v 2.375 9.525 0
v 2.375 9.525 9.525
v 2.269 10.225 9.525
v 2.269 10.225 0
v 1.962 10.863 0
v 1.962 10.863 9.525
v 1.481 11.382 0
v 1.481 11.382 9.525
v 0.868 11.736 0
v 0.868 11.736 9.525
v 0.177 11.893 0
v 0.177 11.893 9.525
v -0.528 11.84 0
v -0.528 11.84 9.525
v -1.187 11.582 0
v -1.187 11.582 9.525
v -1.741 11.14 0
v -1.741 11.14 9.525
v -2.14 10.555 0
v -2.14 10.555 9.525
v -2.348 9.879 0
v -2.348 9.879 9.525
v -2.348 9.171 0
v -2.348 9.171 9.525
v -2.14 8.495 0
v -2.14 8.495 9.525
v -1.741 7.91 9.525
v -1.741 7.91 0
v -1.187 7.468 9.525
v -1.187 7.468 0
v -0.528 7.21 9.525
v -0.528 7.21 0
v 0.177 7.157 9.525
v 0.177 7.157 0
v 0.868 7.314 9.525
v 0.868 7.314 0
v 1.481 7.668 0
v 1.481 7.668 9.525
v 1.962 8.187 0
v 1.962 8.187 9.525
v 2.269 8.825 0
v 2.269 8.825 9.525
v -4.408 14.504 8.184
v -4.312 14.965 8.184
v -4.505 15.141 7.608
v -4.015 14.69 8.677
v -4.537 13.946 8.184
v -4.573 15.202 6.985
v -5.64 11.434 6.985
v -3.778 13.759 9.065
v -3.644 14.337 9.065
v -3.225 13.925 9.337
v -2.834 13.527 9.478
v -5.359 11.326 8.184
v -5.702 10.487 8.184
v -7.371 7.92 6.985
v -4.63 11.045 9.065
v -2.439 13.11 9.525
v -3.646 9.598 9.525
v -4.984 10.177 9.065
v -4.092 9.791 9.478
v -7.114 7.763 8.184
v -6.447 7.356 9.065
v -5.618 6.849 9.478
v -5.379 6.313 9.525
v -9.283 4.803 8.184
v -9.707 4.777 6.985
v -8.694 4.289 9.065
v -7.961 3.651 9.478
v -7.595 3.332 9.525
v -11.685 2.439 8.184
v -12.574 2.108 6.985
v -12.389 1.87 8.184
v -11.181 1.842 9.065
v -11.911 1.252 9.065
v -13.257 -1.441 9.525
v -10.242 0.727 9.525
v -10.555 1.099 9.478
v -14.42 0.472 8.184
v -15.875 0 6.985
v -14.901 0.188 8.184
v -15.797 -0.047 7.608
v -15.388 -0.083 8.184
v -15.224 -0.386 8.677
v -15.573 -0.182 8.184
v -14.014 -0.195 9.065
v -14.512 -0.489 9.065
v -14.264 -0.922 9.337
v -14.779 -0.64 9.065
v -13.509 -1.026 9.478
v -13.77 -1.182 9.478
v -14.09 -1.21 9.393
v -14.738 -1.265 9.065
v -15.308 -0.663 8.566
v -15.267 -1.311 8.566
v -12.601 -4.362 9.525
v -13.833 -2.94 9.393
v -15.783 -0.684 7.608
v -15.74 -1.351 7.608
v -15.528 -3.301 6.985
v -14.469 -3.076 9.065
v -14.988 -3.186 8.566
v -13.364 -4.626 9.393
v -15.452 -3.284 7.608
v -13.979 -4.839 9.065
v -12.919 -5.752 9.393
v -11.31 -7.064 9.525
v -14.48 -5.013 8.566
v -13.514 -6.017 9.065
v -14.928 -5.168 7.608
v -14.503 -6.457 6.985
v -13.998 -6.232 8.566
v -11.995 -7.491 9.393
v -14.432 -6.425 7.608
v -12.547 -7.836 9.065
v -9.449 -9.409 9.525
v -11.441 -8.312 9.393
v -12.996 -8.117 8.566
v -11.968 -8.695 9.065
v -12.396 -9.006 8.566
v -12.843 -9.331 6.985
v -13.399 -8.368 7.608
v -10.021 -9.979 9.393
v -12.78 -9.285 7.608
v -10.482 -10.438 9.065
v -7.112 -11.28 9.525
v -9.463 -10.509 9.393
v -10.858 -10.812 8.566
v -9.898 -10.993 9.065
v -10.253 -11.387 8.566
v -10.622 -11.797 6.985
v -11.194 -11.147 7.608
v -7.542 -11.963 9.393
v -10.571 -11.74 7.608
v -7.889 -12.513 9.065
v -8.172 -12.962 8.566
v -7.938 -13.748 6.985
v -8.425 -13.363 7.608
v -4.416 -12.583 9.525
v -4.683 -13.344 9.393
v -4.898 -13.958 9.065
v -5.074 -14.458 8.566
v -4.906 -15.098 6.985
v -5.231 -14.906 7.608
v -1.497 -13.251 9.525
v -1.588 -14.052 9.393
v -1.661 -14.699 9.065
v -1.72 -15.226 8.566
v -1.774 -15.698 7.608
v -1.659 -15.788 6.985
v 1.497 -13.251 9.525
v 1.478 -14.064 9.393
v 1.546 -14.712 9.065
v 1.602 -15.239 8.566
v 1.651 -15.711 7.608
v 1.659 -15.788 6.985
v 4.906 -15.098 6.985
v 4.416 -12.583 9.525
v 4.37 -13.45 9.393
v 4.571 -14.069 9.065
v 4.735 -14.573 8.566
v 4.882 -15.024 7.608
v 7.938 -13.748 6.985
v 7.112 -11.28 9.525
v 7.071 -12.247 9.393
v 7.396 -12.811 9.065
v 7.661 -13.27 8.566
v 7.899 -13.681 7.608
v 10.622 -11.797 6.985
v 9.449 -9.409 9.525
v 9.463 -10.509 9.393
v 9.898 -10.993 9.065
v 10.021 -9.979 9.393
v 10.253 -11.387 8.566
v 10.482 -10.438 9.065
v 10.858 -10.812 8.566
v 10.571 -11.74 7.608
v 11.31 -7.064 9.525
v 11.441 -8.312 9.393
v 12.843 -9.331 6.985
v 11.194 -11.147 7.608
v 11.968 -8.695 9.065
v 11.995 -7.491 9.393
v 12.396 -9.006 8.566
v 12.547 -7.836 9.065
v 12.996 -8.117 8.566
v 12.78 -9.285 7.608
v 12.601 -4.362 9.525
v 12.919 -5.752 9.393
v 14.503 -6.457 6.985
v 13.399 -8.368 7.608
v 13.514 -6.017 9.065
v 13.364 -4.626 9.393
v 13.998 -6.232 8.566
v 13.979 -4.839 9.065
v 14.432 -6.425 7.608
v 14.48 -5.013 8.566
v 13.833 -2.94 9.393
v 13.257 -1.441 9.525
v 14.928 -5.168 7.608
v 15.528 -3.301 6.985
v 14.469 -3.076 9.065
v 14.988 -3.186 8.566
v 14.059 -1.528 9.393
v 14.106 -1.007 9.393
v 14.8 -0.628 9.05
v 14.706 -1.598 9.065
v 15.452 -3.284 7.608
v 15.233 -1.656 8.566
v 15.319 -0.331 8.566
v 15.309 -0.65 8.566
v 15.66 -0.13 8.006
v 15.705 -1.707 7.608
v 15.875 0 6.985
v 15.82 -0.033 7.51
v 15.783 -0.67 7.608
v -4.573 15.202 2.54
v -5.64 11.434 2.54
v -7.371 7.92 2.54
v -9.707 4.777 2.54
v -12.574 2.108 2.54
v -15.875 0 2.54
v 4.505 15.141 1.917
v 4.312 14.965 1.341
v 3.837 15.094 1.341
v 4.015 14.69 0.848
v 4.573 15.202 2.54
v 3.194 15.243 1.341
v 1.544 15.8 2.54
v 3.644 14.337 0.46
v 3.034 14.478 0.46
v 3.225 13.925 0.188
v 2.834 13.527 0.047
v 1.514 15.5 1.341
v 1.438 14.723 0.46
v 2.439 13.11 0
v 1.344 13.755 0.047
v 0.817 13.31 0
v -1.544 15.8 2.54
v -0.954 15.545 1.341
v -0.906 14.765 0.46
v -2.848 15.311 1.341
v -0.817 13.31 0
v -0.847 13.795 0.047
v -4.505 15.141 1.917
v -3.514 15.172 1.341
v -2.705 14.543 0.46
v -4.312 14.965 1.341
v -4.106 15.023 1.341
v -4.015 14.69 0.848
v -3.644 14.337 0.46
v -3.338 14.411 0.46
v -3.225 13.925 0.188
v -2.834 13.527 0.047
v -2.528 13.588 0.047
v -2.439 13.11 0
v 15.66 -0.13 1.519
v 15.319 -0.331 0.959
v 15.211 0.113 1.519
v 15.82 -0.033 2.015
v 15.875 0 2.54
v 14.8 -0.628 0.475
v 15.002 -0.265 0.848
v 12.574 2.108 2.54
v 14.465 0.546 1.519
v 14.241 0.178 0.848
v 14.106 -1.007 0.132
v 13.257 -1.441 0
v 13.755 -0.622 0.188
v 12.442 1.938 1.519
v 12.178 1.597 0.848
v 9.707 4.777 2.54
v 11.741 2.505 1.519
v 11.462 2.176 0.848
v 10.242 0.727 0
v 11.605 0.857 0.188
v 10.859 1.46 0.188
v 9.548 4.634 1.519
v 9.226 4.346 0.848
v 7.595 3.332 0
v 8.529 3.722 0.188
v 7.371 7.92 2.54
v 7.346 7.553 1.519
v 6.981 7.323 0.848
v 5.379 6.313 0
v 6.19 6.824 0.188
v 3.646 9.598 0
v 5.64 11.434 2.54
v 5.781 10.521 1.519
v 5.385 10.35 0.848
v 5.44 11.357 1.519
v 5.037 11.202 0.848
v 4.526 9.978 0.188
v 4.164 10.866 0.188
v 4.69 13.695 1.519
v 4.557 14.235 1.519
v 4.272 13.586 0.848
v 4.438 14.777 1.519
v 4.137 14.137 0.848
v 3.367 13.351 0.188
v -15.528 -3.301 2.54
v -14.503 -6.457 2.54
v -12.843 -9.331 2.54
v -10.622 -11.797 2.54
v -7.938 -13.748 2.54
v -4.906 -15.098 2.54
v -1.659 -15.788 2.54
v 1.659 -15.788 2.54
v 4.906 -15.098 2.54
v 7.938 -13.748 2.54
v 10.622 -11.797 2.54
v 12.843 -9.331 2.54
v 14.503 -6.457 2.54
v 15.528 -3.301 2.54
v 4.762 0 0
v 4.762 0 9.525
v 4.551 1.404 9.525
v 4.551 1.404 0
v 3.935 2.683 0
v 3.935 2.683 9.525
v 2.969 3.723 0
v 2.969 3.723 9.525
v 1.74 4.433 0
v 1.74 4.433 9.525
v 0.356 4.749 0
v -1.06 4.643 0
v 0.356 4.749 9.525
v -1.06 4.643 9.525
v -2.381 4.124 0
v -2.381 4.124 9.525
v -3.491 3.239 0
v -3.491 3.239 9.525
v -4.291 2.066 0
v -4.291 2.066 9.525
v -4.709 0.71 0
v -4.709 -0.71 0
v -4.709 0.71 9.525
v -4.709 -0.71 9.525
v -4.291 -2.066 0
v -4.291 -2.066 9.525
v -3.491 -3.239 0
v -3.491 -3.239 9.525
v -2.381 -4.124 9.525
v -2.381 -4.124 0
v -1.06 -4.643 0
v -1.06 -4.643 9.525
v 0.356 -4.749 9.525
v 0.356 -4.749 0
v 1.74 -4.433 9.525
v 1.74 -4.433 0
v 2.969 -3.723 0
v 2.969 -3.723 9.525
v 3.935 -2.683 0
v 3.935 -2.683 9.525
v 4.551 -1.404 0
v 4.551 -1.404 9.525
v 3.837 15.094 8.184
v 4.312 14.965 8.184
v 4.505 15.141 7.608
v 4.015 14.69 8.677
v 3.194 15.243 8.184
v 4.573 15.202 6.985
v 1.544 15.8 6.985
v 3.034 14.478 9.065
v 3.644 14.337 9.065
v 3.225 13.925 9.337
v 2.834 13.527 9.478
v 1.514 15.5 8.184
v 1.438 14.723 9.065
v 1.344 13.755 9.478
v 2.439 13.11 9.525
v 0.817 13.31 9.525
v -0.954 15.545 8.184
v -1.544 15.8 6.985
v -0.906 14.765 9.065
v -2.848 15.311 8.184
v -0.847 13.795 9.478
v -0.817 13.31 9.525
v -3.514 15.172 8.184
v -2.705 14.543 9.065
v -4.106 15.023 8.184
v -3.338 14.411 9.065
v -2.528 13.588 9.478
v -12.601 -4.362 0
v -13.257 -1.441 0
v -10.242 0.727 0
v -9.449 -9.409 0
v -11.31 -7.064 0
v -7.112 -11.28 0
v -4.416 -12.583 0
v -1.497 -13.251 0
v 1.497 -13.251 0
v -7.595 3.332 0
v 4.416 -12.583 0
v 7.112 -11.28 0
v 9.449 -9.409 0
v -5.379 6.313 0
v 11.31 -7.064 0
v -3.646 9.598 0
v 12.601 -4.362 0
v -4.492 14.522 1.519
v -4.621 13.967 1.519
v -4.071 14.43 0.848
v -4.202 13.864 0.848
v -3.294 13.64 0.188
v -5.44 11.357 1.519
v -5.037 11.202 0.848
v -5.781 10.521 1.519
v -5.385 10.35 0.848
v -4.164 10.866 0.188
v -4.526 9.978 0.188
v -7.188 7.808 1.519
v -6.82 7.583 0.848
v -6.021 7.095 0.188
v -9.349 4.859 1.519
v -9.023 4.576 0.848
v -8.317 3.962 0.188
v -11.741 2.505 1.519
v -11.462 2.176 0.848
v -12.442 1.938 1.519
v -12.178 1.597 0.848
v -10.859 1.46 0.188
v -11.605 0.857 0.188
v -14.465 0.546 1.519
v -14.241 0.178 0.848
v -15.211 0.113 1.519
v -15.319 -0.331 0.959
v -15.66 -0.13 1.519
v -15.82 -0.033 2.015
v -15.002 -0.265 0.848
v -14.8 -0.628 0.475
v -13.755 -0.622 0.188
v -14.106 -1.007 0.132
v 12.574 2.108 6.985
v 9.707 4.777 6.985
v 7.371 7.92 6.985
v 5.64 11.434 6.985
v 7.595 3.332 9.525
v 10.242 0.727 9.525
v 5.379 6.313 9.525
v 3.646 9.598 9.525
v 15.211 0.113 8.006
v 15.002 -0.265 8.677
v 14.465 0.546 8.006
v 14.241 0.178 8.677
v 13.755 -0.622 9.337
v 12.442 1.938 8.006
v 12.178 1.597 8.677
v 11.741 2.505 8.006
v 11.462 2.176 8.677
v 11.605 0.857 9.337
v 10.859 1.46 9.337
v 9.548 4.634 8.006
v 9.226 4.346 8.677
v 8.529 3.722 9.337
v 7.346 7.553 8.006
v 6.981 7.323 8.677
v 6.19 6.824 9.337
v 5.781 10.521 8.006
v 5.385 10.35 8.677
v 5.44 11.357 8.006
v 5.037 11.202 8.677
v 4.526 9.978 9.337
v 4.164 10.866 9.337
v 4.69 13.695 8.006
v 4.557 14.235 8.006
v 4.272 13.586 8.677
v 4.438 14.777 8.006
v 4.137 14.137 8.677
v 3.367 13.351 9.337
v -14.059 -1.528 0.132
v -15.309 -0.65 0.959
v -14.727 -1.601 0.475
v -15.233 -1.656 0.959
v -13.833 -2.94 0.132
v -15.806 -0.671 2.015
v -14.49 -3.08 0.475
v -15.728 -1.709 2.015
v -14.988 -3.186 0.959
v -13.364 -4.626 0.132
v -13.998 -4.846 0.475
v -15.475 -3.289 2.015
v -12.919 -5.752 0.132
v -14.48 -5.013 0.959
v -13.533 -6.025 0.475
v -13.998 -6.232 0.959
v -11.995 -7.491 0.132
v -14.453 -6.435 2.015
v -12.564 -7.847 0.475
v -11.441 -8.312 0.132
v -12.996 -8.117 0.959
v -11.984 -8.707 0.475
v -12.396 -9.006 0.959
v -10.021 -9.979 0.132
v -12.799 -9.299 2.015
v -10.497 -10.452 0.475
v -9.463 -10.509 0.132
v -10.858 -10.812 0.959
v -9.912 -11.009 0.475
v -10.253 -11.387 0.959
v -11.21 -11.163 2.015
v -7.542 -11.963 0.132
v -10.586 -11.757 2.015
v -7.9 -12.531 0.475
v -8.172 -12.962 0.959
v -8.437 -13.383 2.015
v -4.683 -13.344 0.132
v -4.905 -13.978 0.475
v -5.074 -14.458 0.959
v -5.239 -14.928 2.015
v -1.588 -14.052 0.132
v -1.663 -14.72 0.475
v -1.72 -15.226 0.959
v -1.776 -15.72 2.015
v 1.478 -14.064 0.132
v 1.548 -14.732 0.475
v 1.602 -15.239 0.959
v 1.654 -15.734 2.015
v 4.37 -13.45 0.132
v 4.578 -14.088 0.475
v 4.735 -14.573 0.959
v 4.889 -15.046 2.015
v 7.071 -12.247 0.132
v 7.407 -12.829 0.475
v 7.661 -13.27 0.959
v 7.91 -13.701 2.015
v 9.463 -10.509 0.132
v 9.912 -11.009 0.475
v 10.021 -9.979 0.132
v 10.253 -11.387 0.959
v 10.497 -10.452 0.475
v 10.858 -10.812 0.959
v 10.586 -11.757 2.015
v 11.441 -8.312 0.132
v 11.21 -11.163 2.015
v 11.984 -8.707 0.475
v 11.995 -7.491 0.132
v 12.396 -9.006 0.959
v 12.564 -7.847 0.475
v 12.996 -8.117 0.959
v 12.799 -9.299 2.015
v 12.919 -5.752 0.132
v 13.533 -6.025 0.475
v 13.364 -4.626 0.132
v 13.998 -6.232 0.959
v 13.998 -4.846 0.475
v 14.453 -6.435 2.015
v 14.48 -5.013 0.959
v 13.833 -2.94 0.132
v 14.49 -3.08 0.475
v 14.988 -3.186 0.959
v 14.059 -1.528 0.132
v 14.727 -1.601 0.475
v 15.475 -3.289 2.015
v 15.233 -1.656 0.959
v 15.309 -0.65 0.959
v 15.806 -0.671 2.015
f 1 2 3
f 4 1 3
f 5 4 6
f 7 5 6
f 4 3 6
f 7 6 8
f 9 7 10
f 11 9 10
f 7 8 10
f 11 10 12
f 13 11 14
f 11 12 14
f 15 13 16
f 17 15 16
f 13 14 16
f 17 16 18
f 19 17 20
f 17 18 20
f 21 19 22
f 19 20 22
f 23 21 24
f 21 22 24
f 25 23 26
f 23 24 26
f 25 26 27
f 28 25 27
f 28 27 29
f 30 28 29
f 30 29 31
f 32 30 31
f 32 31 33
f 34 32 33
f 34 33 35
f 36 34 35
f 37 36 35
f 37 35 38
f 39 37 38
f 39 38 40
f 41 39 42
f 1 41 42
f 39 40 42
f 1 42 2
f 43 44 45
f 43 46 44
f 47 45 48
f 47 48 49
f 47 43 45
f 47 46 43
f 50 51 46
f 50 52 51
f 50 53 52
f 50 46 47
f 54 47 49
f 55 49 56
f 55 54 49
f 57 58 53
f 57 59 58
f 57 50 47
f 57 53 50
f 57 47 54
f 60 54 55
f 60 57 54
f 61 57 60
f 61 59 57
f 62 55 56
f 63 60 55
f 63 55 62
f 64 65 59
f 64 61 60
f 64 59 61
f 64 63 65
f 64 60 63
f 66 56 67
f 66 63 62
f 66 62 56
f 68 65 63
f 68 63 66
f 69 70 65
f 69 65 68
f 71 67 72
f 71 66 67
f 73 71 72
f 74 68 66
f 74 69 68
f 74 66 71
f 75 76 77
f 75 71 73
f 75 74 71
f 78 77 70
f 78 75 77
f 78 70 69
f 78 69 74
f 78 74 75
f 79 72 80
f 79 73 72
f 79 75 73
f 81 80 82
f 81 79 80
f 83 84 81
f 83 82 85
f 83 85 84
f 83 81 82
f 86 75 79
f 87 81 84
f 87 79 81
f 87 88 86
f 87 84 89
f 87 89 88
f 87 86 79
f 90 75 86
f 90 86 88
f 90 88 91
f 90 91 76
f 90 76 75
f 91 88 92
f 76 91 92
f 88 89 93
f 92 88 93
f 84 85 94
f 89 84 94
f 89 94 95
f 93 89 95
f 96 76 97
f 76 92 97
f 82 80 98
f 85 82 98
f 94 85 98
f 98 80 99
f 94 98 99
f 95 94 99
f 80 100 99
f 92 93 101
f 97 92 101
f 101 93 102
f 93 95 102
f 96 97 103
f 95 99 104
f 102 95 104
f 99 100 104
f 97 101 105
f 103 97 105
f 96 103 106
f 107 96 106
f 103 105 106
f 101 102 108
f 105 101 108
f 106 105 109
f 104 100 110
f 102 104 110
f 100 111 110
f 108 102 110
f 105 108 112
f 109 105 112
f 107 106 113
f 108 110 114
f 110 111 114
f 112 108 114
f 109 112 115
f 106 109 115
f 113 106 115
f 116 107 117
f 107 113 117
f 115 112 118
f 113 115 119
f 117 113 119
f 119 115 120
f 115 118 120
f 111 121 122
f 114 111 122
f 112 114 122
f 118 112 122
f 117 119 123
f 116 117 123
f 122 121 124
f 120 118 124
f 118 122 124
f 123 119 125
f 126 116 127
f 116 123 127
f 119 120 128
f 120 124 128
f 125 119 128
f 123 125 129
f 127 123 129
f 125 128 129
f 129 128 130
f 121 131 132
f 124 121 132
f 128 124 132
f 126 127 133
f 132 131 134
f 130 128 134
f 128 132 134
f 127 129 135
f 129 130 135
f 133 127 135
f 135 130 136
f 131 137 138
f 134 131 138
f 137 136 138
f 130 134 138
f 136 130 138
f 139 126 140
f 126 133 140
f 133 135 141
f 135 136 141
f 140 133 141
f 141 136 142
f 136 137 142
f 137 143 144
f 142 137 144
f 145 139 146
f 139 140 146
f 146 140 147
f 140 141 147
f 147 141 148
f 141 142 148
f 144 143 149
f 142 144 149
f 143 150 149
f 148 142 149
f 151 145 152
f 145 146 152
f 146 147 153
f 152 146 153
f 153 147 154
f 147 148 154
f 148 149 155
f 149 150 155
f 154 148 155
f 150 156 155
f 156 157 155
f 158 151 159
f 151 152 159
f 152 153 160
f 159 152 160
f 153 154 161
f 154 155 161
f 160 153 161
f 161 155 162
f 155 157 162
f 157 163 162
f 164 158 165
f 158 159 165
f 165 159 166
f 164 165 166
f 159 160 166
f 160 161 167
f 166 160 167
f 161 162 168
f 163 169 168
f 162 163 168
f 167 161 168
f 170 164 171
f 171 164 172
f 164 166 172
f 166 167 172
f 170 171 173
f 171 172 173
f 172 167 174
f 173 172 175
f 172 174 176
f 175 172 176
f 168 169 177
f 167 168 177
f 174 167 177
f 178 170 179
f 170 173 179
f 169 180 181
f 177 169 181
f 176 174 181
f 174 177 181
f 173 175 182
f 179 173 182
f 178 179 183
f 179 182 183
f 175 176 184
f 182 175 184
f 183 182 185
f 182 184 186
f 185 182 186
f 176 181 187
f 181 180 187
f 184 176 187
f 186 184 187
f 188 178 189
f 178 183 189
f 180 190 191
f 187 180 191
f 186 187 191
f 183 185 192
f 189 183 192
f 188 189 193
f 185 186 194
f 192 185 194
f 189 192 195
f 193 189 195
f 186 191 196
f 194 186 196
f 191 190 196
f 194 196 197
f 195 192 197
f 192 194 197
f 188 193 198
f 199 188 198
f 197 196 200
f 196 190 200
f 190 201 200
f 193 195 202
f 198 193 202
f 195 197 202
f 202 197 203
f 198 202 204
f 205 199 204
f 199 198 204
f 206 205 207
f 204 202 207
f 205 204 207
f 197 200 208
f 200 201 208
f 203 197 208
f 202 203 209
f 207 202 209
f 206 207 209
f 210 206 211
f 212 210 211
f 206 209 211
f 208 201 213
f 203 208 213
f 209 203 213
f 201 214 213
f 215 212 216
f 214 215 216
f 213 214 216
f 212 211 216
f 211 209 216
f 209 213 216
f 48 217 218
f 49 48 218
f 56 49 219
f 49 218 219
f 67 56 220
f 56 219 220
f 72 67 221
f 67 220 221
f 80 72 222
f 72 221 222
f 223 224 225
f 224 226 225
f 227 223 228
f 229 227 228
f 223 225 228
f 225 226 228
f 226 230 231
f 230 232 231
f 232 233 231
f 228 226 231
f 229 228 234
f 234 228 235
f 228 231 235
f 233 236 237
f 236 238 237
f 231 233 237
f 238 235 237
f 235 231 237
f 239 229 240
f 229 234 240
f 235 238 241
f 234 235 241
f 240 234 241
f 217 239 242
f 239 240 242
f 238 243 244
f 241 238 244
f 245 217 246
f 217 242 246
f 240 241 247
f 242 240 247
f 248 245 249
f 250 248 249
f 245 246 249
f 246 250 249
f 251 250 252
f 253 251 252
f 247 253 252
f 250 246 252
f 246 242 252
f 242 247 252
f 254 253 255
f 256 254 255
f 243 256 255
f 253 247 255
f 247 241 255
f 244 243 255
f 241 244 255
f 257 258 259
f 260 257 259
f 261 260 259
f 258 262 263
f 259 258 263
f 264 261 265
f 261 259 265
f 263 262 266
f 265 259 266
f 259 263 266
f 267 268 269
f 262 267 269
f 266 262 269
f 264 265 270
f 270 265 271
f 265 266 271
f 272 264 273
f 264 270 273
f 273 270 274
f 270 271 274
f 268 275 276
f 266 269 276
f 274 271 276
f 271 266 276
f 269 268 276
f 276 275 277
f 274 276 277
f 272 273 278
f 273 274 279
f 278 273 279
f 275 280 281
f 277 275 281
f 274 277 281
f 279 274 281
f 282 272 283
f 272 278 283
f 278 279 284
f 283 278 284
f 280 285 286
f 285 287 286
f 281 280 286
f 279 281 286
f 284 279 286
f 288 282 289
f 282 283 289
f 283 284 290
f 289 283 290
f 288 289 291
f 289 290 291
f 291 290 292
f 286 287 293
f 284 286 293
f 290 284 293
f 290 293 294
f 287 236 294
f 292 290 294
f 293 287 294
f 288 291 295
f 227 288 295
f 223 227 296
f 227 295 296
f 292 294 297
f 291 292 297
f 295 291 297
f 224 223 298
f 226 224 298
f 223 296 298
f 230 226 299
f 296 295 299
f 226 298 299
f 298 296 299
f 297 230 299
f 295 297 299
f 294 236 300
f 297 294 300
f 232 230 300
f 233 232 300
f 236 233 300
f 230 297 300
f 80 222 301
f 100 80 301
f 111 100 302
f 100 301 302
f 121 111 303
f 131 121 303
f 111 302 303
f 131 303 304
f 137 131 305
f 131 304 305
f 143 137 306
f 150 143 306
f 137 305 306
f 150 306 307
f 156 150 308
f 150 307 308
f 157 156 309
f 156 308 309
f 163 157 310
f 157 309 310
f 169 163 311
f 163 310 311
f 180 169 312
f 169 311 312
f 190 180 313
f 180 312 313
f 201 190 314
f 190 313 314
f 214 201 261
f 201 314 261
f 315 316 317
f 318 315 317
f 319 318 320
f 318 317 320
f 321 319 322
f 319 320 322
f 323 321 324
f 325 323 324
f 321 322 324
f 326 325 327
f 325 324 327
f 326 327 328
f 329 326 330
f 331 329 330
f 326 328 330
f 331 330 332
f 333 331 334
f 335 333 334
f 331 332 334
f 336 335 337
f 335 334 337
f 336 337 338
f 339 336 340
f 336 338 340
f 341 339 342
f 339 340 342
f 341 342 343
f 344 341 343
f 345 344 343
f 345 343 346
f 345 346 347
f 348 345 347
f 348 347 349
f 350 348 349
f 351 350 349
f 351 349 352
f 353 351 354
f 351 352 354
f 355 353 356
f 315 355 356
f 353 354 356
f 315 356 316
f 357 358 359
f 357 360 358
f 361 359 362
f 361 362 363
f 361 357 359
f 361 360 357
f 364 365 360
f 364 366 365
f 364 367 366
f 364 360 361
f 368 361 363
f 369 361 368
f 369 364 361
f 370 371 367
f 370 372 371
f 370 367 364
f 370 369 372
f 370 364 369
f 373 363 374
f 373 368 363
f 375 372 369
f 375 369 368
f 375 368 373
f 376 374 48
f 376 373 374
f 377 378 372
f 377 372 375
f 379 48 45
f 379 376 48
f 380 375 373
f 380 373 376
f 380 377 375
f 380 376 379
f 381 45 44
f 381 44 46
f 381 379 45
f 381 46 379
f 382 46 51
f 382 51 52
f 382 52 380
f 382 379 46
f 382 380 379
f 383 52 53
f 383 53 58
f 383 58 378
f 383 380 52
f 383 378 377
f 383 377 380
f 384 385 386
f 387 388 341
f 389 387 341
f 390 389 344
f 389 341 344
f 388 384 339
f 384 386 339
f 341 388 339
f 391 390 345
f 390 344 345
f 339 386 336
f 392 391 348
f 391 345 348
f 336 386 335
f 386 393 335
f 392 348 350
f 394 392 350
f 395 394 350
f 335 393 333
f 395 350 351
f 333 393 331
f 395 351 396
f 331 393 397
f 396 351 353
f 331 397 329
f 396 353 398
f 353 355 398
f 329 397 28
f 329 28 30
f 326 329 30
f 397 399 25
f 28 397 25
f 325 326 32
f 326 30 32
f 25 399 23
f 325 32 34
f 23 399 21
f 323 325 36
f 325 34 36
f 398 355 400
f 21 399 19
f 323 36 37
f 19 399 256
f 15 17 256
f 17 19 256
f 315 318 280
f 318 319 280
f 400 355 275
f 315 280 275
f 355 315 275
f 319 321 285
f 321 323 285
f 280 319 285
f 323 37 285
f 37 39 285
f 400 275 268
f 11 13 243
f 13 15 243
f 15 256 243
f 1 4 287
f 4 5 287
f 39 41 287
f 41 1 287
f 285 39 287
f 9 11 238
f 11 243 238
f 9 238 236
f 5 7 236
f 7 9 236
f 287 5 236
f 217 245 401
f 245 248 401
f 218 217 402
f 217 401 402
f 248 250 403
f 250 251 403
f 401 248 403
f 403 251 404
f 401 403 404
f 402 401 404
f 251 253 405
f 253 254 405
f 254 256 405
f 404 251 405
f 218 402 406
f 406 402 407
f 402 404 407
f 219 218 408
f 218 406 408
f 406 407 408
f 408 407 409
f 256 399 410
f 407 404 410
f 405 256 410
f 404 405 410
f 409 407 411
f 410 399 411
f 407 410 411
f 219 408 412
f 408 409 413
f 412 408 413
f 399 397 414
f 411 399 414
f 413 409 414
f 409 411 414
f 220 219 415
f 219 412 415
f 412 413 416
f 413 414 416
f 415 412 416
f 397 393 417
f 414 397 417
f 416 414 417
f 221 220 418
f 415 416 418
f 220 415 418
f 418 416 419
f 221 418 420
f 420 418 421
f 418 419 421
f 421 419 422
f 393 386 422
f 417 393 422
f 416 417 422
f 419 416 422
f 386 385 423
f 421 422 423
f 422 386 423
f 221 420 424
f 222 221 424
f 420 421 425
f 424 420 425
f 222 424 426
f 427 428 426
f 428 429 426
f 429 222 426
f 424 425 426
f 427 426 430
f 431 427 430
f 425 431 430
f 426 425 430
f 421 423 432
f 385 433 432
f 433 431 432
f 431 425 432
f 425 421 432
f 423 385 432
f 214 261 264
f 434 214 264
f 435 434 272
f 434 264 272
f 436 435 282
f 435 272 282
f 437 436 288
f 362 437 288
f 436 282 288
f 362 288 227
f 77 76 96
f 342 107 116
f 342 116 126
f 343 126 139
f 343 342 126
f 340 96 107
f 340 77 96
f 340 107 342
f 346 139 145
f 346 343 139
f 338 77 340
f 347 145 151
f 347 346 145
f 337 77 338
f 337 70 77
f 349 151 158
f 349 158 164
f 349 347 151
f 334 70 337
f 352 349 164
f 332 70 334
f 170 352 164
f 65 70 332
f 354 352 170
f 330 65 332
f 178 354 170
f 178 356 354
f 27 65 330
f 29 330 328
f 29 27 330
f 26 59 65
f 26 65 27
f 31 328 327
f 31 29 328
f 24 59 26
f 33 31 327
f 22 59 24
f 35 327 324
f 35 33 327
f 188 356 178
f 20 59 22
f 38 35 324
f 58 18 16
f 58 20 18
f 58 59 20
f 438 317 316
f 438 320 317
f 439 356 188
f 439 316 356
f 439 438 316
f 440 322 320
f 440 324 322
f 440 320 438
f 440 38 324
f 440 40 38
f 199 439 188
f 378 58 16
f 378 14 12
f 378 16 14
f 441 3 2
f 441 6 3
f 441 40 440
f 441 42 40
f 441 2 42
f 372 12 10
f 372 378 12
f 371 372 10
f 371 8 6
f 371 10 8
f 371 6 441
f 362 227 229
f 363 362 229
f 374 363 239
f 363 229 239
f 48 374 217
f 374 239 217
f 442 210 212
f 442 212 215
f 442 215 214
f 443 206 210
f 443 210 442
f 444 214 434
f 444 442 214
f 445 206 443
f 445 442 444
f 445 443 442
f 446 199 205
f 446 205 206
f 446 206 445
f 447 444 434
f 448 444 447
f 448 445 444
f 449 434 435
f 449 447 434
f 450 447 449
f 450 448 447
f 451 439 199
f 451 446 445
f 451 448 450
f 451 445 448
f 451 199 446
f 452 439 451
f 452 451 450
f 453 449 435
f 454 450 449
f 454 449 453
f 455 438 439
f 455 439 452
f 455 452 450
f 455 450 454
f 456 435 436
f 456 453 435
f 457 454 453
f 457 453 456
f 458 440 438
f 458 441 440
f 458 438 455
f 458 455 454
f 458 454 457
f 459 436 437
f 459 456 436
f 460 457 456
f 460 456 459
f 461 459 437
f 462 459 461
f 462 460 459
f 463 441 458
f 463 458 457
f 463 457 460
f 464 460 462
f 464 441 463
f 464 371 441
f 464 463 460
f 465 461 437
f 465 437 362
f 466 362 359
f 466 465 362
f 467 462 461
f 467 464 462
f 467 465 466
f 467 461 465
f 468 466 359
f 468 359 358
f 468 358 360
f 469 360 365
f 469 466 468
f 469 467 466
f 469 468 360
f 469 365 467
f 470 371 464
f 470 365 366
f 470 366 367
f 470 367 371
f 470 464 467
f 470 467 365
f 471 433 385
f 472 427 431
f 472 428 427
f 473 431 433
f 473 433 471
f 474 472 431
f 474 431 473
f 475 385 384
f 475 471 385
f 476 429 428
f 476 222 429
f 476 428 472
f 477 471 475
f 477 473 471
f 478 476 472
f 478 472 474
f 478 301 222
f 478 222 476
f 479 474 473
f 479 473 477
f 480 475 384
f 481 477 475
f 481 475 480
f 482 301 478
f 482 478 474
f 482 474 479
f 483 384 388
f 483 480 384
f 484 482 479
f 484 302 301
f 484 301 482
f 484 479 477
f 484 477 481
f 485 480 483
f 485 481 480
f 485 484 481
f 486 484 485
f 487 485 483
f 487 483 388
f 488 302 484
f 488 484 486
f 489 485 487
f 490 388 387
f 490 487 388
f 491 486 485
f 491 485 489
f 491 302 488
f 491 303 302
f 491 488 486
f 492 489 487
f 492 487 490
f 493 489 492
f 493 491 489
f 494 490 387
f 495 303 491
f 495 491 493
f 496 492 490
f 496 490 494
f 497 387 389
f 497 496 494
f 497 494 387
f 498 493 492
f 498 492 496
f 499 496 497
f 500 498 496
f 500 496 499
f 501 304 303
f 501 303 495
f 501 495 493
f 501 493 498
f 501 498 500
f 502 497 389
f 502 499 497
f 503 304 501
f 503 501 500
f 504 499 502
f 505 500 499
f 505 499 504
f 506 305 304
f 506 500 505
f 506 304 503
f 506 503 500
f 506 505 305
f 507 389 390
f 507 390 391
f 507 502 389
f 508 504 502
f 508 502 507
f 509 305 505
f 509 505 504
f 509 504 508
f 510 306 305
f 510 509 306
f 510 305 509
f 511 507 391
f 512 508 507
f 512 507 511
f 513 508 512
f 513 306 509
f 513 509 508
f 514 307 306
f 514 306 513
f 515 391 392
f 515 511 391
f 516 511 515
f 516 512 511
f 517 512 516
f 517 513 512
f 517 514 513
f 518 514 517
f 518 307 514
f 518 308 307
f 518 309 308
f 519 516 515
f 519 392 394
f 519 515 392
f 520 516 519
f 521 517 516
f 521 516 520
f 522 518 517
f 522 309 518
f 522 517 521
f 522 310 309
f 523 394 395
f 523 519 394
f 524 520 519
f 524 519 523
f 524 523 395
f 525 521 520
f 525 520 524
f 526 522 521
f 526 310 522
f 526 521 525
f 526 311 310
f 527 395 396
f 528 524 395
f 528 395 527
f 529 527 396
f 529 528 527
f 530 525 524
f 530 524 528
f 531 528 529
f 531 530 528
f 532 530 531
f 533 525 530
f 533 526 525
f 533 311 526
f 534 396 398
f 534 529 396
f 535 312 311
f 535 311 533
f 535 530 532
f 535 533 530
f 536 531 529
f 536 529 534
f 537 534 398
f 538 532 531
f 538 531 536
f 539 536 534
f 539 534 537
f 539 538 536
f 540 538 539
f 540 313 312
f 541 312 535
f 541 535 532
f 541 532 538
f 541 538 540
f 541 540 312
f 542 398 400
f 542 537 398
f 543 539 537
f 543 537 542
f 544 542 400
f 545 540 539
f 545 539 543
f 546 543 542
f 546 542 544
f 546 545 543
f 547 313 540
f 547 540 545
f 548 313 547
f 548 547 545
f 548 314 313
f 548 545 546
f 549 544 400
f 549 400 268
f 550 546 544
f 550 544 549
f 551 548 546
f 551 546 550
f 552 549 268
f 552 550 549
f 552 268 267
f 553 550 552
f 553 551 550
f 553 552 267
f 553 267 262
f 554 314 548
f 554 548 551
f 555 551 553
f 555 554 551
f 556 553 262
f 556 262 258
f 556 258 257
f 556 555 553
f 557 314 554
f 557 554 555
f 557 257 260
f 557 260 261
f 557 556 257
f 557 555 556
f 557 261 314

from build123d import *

# Parameters (mm, degrees)
BOSS_EXTRUDE1_DEPTH = 9.525
SKETCH2_R           = 4.7625
SKETCH2_R_2         = 2.3749
CUT_EXTRUDE1_DEPTH  = 9.525
FILLET1_R           = 2.54


with BuildPart() as part:
    # Sketch1 → Boss-Extrude1 (new body)
    with BuildSketch(Plane.XY):
        with BuildLine():
            ThreePointArc((4.57280399, 15.202140924), (0, 15.875), (-4.57280399, 15.202140924))
            ThreePointArc((-4.57280399, 15.202140924), (-8.467578202, 6.295312552), (-15.875, 0))
            ThreePointArc((-15.875, 0), (0, -15.875), (15.875, 0))
            ThreePointArc((15.875, 0), (8.467578202, 6.295312552), (4.57280399, 15.202140924))
        make_face()
    extrude(amount=BOSS_EXTRUDE1_DEPTH)

    # Sketch2 → Cut-Extrude1 (cut)
    with BuildSketch(Plane.XY.offset(9.525)):
        Circle(SKETCH2_R)
        with Locations((0, 9.525)):
            Circle(SKETCH2_R_2)
    extrude(amount=-CUT_EXTRUDE1_DEPTH, mode=Mode.SUBTRACT)

    # Fillet1
    fillet1_edges = [part.edges().sort_by_distance(p)[0] for p in [
        (-8.467578202, 6.295312552, 9.525),
        (0, -15.875, 9.525),
        (8.467578202, 6.295312552, 9.525),
        (0, -15.875, 0),
        (-8.467578202, 6.295312552, 0),
        (0, 15.875, 0),
        (8.467578202, 6.295312552, 0),
        (0, 15.875, 9.525),
    ]]
    fillet(fillet1_edges, radius=FILLET1_R)


solid = part.part
